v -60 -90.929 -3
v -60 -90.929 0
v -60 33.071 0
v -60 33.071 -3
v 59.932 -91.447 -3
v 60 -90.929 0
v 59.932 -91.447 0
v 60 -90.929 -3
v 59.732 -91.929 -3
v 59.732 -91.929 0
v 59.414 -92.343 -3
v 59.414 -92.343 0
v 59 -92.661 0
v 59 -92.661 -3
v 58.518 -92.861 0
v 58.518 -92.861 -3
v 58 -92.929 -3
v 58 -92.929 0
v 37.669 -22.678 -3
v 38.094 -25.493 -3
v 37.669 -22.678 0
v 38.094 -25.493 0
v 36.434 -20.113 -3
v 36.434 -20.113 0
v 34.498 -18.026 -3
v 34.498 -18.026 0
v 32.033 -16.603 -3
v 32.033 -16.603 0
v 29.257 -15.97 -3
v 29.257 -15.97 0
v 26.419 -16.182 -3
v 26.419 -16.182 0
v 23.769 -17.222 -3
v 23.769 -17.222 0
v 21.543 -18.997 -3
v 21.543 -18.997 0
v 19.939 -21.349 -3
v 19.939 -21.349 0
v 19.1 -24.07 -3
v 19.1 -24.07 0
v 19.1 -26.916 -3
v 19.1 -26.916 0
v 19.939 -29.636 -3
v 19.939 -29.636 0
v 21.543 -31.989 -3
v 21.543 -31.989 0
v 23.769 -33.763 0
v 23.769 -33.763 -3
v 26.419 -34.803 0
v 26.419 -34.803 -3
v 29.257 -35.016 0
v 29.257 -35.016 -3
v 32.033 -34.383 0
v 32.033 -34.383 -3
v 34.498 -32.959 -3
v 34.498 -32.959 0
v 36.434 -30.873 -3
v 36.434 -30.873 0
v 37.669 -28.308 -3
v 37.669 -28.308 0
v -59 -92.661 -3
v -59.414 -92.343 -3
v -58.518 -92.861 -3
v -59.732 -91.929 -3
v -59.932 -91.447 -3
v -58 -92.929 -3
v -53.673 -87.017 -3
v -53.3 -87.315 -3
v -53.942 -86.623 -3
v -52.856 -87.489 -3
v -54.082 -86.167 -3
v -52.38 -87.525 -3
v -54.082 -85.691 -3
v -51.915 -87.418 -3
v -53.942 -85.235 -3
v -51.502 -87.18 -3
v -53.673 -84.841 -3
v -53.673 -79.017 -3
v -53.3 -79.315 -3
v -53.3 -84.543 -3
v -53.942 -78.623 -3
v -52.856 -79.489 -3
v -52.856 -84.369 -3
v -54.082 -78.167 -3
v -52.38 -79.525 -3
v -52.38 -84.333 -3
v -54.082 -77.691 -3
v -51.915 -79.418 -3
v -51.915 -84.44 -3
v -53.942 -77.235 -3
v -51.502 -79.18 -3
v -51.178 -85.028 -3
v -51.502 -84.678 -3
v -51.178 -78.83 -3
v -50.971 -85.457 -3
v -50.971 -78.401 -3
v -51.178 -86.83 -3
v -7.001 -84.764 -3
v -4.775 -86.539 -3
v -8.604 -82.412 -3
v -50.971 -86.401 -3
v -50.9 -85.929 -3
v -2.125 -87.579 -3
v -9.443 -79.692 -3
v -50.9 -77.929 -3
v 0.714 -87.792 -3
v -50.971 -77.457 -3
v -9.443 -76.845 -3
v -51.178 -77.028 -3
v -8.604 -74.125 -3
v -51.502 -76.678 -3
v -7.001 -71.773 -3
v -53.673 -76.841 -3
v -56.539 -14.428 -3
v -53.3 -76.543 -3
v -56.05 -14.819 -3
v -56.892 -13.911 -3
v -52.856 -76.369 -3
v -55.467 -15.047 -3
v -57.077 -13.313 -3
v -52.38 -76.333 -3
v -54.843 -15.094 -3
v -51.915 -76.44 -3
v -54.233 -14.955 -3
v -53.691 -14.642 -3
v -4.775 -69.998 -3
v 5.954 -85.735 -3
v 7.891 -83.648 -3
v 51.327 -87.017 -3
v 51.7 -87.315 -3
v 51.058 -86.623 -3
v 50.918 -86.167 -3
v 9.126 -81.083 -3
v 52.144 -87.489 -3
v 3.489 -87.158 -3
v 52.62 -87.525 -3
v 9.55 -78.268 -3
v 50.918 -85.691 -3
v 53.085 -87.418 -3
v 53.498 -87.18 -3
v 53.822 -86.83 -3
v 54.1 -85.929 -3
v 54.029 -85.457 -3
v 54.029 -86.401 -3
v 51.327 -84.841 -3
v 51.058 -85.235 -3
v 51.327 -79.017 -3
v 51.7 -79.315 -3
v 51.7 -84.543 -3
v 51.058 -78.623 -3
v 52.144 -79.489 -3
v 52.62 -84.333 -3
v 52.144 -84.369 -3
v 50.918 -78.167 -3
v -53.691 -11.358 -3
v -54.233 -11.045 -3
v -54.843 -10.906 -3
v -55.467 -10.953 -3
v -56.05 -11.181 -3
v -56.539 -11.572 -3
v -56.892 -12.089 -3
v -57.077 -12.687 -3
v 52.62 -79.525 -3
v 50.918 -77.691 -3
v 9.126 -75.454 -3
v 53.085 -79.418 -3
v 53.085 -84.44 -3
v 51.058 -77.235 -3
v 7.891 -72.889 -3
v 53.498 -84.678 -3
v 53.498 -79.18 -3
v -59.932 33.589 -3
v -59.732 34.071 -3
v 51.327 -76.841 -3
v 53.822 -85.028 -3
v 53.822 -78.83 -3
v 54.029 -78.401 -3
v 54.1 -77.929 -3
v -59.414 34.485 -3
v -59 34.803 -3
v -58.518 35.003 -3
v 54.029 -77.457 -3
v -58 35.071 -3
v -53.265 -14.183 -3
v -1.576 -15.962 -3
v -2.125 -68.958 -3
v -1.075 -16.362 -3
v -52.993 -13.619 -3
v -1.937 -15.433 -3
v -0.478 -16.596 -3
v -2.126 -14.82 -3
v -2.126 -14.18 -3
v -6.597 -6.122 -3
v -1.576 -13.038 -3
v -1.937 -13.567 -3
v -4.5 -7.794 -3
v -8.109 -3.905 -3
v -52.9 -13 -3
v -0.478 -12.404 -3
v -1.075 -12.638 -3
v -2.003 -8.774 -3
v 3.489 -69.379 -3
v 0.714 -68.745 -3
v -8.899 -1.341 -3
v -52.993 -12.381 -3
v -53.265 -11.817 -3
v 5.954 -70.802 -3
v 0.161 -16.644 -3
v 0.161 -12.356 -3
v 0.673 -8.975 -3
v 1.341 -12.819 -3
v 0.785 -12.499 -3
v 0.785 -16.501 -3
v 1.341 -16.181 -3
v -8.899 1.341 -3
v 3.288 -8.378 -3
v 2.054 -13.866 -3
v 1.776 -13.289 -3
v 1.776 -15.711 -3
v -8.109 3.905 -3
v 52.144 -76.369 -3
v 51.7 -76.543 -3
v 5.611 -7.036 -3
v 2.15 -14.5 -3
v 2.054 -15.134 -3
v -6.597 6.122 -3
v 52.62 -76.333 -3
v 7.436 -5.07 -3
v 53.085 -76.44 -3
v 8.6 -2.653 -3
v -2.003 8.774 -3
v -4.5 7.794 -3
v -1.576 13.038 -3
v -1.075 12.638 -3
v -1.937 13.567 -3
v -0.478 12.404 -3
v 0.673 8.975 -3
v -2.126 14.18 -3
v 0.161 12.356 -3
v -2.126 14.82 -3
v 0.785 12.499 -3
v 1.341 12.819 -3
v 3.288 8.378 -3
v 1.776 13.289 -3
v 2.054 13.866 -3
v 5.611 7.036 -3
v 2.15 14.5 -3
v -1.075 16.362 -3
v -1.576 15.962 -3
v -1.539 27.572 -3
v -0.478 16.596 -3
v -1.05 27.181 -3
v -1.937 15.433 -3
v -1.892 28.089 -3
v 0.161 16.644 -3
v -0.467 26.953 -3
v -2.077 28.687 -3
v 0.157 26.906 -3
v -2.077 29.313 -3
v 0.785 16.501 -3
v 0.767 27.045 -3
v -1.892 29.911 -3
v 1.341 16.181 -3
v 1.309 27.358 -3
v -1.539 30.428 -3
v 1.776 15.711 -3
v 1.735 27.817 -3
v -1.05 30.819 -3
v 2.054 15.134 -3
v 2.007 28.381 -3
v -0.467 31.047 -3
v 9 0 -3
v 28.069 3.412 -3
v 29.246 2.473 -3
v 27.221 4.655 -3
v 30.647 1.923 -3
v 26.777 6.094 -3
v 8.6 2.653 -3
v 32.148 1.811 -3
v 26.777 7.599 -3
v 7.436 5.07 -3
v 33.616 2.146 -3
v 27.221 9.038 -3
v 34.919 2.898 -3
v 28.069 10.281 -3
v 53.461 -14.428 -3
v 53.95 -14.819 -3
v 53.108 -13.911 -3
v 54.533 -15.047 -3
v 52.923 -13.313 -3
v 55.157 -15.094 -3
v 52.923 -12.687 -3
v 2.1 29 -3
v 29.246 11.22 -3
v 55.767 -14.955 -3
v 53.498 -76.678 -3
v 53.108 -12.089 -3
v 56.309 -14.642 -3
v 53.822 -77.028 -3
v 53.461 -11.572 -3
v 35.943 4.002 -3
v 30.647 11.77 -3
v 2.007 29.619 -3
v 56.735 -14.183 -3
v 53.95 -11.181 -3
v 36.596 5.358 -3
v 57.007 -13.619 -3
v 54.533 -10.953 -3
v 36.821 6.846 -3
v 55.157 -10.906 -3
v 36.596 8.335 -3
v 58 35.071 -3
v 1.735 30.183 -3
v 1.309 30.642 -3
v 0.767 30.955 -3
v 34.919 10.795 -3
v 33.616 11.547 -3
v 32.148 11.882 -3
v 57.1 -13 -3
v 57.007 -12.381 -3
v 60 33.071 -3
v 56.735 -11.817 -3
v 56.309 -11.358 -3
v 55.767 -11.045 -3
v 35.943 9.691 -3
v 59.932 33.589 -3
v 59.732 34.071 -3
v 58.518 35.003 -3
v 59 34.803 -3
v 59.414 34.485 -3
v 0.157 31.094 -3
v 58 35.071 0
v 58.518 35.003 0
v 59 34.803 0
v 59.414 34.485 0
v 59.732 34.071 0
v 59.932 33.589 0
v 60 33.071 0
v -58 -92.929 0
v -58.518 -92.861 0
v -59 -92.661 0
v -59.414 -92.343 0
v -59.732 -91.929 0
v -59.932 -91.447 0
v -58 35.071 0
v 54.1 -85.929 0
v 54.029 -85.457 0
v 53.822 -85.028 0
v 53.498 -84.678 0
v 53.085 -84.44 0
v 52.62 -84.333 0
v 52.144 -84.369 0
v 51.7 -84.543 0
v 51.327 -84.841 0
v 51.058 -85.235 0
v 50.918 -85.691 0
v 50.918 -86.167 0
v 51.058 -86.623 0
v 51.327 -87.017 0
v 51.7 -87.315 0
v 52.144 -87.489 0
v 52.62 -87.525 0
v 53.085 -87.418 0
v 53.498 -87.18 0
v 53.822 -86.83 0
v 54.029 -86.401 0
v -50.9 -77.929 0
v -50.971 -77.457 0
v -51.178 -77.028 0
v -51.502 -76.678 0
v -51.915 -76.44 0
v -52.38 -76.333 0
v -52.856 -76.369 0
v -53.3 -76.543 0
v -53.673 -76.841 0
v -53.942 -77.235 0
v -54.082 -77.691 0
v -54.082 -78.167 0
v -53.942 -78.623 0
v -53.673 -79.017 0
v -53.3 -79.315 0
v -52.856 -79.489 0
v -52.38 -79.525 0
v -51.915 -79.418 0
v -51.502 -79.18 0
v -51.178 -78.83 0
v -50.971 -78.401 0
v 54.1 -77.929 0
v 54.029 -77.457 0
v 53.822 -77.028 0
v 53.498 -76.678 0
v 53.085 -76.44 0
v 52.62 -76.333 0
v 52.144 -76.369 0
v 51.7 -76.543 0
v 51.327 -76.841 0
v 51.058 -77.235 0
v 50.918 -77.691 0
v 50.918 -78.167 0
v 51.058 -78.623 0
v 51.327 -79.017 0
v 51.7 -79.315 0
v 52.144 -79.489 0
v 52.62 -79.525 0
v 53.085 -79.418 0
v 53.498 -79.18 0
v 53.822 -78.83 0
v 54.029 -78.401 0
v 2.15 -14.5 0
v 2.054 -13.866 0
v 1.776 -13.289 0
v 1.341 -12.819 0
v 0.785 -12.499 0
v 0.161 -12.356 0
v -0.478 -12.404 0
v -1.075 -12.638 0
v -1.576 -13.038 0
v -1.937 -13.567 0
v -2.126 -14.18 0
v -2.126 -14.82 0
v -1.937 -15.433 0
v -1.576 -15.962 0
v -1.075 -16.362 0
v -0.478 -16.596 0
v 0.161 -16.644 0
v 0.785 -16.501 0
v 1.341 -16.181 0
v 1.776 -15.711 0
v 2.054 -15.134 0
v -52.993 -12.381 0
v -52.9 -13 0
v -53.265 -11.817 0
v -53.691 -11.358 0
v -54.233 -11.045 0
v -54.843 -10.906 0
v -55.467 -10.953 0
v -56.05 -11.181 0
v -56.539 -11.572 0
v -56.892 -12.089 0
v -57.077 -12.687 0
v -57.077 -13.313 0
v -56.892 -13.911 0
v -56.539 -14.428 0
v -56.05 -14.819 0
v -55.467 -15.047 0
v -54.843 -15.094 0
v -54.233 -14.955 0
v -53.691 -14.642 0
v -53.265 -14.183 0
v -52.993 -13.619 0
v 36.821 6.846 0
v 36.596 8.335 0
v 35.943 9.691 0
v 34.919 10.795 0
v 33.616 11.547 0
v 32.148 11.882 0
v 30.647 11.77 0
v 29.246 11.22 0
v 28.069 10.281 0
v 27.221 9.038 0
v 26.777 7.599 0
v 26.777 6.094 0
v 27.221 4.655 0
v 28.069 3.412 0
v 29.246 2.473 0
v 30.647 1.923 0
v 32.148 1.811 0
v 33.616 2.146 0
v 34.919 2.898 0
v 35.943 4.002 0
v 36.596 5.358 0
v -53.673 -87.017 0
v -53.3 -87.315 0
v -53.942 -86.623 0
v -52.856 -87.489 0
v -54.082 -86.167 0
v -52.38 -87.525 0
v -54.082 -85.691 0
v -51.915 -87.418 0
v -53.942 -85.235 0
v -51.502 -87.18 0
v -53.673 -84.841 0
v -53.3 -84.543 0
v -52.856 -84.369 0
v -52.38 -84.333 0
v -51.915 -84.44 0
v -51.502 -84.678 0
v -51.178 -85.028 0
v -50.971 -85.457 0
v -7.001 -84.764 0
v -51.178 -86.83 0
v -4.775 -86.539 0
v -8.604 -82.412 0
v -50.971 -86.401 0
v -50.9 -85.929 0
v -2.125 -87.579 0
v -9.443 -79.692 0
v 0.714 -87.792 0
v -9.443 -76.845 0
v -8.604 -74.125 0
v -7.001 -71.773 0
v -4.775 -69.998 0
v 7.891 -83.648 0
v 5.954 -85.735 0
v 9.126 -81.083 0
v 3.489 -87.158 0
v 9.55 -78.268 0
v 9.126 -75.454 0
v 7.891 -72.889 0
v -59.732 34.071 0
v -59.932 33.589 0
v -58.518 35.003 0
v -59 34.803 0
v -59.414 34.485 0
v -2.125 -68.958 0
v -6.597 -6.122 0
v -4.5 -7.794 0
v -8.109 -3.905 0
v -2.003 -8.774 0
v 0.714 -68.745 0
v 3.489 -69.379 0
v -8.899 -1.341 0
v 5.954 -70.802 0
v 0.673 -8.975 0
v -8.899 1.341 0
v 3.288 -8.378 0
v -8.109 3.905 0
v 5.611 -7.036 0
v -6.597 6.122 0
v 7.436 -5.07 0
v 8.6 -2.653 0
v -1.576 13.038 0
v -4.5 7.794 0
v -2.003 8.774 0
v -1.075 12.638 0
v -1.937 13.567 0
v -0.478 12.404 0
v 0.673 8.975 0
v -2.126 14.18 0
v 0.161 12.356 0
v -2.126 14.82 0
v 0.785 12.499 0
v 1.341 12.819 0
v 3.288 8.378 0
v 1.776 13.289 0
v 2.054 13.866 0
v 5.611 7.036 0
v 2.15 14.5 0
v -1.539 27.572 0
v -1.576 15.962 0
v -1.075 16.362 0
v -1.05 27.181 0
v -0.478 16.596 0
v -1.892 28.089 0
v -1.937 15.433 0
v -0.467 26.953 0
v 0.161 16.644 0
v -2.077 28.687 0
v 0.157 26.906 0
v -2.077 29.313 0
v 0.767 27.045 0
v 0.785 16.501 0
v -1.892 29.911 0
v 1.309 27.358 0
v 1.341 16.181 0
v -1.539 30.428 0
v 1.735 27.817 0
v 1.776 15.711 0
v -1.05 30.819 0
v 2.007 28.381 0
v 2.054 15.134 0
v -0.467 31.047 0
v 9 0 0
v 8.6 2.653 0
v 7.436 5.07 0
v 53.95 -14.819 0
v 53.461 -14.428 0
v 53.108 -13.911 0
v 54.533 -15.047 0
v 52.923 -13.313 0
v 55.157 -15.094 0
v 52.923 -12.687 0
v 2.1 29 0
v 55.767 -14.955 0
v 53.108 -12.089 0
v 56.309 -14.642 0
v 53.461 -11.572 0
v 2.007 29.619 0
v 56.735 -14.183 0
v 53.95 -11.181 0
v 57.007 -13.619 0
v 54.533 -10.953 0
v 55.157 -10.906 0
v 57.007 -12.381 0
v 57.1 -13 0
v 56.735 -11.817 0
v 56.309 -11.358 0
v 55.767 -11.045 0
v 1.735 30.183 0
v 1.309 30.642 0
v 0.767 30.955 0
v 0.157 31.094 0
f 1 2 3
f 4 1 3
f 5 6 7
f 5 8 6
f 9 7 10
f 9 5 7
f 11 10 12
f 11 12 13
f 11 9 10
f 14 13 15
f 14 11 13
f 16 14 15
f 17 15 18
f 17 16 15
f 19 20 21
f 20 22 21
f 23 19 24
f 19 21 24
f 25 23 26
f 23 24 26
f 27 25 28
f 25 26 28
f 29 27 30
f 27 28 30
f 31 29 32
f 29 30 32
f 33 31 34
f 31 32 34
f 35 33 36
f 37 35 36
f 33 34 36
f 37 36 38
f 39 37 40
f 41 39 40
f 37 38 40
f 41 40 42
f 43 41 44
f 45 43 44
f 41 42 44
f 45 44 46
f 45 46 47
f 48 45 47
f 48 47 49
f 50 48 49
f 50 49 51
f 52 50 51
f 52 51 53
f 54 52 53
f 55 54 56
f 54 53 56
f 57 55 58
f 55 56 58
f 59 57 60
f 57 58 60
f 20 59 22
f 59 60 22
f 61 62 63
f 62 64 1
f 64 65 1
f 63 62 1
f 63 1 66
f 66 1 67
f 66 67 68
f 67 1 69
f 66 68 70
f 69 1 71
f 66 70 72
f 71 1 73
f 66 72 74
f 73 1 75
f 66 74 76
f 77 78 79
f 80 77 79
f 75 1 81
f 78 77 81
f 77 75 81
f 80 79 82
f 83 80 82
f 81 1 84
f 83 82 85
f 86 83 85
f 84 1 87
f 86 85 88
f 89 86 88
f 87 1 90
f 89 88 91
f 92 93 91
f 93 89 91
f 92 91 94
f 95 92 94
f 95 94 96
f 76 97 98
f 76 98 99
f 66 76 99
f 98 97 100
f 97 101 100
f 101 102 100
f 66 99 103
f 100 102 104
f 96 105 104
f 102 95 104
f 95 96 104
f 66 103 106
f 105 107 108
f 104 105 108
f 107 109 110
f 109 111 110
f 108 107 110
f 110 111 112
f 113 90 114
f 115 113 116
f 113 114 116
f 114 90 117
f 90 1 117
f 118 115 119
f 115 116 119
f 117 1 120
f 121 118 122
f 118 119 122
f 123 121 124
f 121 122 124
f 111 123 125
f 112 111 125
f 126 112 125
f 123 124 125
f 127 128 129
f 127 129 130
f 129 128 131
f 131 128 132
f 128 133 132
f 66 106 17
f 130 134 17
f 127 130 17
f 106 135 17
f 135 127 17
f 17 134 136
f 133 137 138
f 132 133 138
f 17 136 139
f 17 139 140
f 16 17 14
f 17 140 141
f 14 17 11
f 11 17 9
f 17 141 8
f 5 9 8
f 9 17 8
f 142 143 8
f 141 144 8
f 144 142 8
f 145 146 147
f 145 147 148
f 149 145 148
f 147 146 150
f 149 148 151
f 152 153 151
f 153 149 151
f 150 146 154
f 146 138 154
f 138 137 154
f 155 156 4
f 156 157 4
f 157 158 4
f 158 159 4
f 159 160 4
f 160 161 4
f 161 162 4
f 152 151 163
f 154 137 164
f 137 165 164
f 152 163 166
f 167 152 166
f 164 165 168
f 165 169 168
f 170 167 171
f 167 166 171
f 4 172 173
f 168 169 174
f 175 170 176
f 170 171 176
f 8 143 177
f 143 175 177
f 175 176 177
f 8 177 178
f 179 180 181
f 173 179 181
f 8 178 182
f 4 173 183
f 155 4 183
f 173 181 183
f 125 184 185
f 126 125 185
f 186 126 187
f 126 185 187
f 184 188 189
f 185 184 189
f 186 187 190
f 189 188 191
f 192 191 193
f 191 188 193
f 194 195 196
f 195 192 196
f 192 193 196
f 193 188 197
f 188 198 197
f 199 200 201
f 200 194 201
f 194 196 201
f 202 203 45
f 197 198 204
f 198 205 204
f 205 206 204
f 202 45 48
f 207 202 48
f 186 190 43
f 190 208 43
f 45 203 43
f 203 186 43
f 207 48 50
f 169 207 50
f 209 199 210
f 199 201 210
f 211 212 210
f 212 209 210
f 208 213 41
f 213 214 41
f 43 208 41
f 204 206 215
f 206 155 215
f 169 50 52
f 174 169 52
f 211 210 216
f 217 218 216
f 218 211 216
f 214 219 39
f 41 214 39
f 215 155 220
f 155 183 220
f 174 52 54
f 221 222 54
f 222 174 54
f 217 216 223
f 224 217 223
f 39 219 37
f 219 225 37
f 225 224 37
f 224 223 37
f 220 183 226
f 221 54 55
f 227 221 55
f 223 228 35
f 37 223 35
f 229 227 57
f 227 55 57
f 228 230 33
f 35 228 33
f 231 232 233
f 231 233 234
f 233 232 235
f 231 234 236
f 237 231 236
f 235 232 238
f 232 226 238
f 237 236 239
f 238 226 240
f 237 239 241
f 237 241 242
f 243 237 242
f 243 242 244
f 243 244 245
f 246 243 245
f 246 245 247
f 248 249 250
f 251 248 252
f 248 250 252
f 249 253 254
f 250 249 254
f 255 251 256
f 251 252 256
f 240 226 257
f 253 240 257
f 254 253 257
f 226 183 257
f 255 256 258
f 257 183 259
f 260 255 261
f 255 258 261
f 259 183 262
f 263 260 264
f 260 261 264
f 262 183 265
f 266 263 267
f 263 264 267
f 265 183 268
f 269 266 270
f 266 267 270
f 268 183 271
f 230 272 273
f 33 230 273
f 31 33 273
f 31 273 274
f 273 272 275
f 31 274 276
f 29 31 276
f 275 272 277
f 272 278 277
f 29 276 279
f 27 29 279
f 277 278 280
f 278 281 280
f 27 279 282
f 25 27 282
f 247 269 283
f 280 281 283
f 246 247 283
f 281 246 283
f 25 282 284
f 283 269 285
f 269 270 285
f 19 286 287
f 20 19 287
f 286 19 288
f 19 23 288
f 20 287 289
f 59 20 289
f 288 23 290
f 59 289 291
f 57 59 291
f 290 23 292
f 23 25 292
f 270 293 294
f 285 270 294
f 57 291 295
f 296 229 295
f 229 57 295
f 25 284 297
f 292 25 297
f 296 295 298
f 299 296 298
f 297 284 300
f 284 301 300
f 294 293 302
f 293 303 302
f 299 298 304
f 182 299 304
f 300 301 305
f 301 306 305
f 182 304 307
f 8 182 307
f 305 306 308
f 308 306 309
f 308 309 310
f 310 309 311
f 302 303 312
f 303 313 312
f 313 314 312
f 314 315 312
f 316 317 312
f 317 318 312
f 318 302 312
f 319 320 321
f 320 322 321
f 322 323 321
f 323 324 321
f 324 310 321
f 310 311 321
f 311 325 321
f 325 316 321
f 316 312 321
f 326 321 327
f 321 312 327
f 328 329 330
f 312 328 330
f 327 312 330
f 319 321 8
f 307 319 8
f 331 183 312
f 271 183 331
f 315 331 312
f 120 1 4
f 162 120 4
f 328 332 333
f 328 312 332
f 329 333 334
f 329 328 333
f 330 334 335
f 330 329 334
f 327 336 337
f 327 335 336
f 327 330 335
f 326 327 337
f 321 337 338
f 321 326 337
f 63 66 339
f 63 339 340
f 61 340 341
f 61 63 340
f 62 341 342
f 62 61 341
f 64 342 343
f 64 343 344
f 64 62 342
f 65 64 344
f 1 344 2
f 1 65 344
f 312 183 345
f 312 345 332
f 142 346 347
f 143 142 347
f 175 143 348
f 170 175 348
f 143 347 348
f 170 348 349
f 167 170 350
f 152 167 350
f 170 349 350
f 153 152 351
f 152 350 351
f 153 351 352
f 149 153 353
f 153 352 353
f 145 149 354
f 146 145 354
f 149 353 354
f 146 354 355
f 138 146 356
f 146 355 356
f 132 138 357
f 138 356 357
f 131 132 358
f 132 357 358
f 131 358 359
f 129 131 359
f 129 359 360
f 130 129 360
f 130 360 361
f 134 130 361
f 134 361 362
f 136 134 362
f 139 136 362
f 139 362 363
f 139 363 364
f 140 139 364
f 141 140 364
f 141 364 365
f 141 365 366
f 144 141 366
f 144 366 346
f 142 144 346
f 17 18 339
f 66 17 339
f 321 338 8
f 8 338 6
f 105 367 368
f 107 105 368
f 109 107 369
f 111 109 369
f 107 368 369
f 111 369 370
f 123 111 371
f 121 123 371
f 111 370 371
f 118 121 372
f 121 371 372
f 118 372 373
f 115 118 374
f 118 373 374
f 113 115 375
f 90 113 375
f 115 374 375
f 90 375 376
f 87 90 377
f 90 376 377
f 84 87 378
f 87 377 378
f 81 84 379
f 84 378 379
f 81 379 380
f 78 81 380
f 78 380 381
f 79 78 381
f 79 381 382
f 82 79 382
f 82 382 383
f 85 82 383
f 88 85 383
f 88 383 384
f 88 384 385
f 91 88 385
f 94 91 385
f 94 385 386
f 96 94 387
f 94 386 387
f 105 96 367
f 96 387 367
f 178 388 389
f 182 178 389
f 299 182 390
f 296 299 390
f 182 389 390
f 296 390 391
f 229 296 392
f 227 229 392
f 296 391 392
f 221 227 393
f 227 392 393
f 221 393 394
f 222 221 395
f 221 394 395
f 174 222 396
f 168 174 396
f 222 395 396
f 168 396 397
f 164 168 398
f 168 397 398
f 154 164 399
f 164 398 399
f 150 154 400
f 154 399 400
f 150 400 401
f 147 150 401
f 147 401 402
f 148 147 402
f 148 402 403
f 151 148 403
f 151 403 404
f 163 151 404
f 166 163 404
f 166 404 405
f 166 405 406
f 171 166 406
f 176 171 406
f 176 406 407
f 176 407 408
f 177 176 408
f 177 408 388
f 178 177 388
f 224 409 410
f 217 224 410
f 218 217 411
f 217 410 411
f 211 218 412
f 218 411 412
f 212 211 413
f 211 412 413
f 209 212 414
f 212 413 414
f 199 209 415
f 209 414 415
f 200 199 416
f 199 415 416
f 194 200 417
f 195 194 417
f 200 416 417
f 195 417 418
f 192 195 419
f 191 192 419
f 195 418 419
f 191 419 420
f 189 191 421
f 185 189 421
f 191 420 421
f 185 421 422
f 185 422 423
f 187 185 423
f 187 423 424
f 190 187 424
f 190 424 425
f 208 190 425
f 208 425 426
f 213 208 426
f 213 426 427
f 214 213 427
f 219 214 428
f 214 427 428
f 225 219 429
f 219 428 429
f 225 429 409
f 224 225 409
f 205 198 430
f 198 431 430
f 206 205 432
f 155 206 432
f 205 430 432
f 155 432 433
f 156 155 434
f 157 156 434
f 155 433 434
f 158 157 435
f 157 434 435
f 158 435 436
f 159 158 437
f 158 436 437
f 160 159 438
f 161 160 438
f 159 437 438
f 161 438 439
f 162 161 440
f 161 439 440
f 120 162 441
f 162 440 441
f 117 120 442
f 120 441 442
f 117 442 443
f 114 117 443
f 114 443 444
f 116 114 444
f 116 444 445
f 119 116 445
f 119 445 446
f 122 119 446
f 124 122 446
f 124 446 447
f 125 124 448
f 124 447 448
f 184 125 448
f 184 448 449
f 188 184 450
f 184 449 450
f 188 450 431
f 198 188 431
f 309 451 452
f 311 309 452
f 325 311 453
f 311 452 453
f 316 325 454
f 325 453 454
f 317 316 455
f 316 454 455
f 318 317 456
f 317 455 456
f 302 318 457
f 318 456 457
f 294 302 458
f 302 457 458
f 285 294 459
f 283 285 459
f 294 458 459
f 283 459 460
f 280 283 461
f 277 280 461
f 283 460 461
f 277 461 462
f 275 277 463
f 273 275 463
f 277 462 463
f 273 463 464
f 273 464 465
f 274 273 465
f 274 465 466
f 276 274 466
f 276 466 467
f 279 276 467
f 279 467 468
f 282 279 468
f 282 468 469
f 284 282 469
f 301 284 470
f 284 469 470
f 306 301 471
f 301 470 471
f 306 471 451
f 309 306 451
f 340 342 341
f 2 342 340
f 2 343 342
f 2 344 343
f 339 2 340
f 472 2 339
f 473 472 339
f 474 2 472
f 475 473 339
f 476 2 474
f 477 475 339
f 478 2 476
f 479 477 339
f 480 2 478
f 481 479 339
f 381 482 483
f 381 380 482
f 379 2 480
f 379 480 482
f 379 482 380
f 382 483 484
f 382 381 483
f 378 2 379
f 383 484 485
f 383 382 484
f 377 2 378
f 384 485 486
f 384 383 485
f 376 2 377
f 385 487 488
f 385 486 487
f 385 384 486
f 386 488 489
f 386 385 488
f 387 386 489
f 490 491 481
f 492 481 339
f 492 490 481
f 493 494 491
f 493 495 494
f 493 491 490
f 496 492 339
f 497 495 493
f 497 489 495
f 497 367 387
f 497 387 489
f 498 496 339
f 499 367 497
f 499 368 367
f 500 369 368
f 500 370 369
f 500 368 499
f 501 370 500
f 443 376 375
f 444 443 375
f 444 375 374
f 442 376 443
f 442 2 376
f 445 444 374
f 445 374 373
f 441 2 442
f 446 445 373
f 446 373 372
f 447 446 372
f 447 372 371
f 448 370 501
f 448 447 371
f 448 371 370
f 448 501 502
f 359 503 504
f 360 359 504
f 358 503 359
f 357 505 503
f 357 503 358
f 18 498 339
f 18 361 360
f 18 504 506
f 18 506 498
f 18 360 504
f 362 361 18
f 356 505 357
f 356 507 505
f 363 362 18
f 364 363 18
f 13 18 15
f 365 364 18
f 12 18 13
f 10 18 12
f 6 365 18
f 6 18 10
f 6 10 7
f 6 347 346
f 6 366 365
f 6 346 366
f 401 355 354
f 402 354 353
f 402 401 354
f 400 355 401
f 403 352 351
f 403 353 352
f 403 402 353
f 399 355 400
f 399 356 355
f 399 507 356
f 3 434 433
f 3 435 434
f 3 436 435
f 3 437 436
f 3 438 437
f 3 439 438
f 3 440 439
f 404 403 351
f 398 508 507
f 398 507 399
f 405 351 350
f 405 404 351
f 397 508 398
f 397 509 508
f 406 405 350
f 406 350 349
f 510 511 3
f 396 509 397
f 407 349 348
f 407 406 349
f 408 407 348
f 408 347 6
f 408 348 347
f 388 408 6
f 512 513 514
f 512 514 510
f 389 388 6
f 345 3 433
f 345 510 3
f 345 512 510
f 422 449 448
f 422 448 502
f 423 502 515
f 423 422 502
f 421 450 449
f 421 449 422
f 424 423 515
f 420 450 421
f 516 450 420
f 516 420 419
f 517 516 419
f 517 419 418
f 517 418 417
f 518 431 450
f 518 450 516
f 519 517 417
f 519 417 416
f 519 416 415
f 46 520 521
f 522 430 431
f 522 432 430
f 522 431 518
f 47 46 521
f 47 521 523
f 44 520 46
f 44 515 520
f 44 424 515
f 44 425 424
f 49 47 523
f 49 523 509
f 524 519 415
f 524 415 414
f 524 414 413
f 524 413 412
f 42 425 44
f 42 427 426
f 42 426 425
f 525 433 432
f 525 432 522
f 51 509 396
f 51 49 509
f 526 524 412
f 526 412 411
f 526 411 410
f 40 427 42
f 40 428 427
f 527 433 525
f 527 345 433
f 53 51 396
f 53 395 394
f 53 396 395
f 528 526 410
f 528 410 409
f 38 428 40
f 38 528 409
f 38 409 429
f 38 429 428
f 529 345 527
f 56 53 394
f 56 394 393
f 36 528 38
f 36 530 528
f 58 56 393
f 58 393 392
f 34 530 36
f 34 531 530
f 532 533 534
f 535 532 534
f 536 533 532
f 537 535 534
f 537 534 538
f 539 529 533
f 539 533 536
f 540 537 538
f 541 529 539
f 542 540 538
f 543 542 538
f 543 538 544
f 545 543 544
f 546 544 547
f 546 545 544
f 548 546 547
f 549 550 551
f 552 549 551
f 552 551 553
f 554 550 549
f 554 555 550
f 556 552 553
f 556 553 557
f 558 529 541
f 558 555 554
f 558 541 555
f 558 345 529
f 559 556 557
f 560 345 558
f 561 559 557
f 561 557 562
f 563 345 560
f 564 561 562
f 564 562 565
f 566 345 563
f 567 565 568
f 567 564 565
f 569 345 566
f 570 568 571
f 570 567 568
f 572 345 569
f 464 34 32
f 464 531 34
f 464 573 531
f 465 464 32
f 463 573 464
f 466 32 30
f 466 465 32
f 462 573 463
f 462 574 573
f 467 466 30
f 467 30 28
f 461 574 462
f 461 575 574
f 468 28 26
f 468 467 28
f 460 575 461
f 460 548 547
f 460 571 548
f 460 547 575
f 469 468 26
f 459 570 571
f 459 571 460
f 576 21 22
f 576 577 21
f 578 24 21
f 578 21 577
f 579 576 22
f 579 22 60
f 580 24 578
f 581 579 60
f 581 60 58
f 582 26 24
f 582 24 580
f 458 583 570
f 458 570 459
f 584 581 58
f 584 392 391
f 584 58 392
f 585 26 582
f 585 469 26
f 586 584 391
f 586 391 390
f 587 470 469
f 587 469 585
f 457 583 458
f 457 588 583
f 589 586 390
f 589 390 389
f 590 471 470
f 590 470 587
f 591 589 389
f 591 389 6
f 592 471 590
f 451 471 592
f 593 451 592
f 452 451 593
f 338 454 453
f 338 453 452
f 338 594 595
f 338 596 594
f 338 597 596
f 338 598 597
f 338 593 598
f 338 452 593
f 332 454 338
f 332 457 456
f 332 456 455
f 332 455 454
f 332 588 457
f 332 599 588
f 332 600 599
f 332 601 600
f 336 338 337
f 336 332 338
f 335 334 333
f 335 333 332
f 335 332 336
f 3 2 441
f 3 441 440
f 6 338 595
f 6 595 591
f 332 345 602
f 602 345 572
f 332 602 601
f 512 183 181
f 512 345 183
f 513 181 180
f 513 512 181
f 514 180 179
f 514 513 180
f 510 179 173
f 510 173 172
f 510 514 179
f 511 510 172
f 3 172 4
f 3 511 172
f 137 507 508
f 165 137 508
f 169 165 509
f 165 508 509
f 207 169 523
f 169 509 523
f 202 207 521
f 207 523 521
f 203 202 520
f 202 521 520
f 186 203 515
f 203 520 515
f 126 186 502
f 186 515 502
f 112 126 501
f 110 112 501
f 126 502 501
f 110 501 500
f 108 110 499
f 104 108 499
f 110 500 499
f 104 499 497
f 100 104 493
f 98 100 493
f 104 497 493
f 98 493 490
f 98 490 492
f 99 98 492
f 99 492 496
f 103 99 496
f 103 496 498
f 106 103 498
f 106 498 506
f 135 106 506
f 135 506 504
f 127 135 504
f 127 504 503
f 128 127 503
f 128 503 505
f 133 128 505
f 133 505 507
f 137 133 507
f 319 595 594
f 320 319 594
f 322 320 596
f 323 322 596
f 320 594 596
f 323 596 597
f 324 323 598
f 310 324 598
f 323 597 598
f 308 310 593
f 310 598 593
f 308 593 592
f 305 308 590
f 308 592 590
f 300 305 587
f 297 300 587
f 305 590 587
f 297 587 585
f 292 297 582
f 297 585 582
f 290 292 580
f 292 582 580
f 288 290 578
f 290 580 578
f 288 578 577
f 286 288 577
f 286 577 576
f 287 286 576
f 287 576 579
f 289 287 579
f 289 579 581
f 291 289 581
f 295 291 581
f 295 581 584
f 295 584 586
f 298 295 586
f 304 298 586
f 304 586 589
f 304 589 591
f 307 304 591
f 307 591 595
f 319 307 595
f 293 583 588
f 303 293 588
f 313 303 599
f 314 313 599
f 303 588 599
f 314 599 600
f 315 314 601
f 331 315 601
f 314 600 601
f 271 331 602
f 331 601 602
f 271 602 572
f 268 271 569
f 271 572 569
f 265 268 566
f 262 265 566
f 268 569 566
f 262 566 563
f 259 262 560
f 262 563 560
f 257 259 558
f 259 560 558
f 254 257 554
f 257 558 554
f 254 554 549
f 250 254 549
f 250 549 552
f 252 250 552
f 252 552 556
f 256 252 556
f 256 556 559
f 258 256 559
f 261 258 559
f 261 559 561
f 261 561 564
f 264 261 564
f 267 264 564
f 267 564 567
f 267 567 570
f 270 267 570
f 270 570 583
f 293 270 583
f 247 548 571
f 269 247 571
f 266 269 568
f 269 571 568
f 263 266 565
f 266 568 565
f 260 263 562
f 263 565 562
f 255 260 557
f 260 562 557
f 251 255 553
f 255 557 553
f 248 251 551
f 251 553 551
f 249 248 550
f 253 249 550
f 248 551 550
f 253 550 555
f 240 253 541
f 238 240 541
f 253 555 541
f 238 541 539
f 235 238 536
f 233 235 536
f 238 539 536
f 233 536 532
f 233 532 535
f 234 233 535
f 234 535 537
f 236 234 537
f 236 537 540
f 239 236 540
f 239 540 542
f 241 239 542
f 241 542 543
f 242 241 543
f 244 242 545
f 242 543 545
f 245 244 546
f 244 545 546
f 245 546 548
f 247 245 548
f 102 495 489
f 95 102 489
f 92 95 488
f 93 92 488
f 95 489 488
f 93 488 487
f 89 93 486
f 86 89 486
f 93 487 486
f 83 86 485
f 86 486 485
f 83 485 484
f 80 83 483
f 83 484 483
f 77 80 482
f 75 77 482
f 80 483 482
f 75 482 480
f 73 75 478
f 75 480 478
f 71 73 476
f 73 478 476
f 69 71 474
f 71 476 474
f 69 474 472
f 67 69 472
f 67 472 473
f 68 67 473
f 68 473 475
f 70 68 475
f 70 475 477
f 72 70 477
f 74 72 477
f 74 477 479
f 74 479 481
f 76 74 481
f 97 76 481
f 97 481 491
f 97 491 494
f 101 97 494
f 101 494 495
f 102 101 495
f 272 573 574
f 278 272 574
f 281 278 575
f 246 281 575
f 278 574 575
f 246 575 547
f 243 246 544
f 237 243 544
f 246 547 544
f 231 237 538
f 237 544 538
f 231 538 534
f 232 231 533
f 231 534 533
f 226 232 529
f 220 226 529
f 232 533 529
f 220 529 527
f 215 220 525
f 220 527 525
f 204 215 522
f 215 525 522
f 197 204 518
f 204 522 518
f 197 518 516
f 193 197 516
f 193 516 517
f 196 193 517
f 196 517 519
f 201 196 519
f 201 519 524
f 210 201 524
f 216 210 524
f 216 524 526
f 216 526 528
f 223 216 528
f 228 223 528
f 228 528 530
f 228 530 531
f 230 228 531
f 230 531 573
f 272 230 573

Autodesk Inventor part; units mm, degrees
ref_plane "YZ Plane" through (0, 0, 0) normal (1, 0, 0) x (0, 1, 0)
ref_plane "XZ Plane" through (0, 0, 0) normal (0, 1, 0) x (-1, 0, 0)
ref_plane "XY Plane" through (0, 0, 0) normal (0, 0, 1) x (1, 0, 0)
sketch "スケッチ3" plane through (0, 0, 0) normal (0, 0, 1) x (1, 0, 0)
  line L0 (60, -99.3436) -> (-60, -99.3436)
  line L1 (-60, -99.3436) -> (-60, 99.3436)
  line L2 (-60, 99.3436) -> (60, 99.3436)
  line L3 (60, 99.3436) -> (60, -99.3436)
  line L4 (60, -99.3436) -> (-60, 99.3436) construction
  line L5 (-60, -99.3436) -> (60, 99.3436) construction
  point P0 (0, 0)
  dimension "d25" = 120
extrude "押し出し1" add sketch "スケッチ3" against normal blind 3
sketch "スケッチ4" plane through (0, 0, 0) normal (0, 0, 1) x (1, 0, 0)
  line L0 (0, 45.0711) -> (68.3595, 45.0711)
  line L1 (68.3595, 45.0711) -> (-74.3824, 45.0711)
  line L2 (-74.3824, 45.0711) -> (108.1656, 45.0711)
  line L3 (108.1656, 45.0711) -> (108.1656, 129.4154)
  line L4 (108.1656, 129.4154) -> (-74.3824, 129.4154)
  line L5 (-74.3824, 129.4154) -> (-74.3824, 45.0711)
  point P0 (0, 0)
extrude "押し出し4" cut sketch "スケッチ4" against normal blind 10
sketch "スケッチ12" plane through (0, 0, 0) normal (0, 0, 1) x (1, 0, 0)
  circle A0 centre (0, 0) radius 9
  circle A1 centre (0, 0) radius 22.5
  dimension "d85" = 18
  dimension "d93" = 45
sketch "スケッチ13" plane through (0, 0, 0) normal (0, 0, 1) x (1, 0, 0)
  circle A0 centre (0, 0) radius 7.5
  circle A1 centre (0, 0) radius 32.5
  circle A2 centre (31.7707, 6.8465) radius 25
  circle A3 centre (31.7707, 6.8465) radius 7.5
  circle A4 centre (31.7707, 6.8465) radius 32.5
  circle A5 centre (28.5436, -25.4929) radius 25
  circle A6 centre (28.5436, -25.4929) radius 20
  circle A7 centre (28.5436, -25.4929) radius 60
  circle A8 centre (0, -78.2685) radius 40
  circle A9 centre (0, -78.2685) radius 50
  circle A10 centre (31.7707, 6.8465) radius 5.05
  circle A11 centre (28.5436, -25.4929) radius 9.55
  circle A12 centre (0, -78.2685) radius 9.55
  dimension "d87" = 65
  dimension "d89" = 65
  dimension "d91" = 120
  dimension "d86" = 15
  dimension "d88" = 15
  dimension "d90" = 40
  dimension "d92" = 100
  dimension "d96" = 10.1
  dimension "d97" = 19.1
  dimension "d98" = 19.1
extrude "押し出し15" cut sketch "スケッチ12" against normal blind 10 contours A0
extrude "押し出し16" cut sketch "スケッチ13" against normal blind 10 contours A10 A1 | A1 A10 | A11 A1 A2 | A2 A1 A4 A11 | A4 A1 A11 | A2 A11 A4 A1 | A1 A11 A2 | A4 A11 A1 | A12 A7 | A7 A12
sketch "スケッチ14" plane through (0, 0, 0) normal (0, 0, 1) x (1, 0, 0)
  line L0 (-60, -99.3436) -> (-60, 45.0711) projected
  line L1 (60, 45.0711) -> (60, -99.3436) projected
  line L2 (-60, 45.0711) -> (60, 45.0711)
  line L3 (60, 45.0711) -> (60, -92.9289)
  line L4 (60, -92.9289) -> (-60, -92.9289)
  line L5 (-60, -92.9289) -> (-60, 45.0711)
  point P0 (0, 0)
  dimension "d101" = 138
extrude "押し出し17" cut sketch "スケッチ14" against normal blind 10 keep common part
sketch "スケッチ15" plane through (-60, 45.0711, 0) normal (0, 1, 0) x (1, 0, 0)
  line L0 (-15.5399, 21.7204) -> (138.9638, 21.7204)
  line L1 (138.9638, 21.7204) -> (138.9638, -41.1938)
  line L2 (138.9638, -41.1938) -> (-15.5399, -41.1938)
  line L3 (-15.5399, -41.1938) -> (-15.5399, 21.7204)
  point P0 (60, 0)
extrude "押し出し18" cut sketch "スケッチ15" against normal blind 10
sketch "スケッチ16" plane through (0, 0, 0) normal (0, 0, 1) x (1, 0, 0)
  circle A0 centre (31.7707, 6.8465) radius 5.05 projected
  circle A1 centre (31.7707, 6.8465) radius 25
  circle A2 centre (28.5436, -25.4929) radius 9.55 projected
  circle A3 centre (28.5436, -25.4929) radius 25
  circle A4 centre (55, -13) radius 2.1
  circle A5 centre (-55, -13) radius 2.1
  circle A6 centre (0, 29) radius 2.1
  point P0 (0, 0)
  dimension "d109" = 50
  dimension "d110" = 50
  dimension "d111" = 4.2
  dimension "d112" = 4.2
  dimension "d113" = 4.2
extrude "押し出し19" cut sketch "スケッチ16" against normal blind 10 contours A4 | A5 | A6
sketch "スケッチ17" plane through (0, 0, 0) normal (0, 0, 1) x (1, 0, 0)
  line L0 (0, 0) -> (0, 14.5)
  line L1 (0, 14.5) -> (0, -14.5)
  circle A0 centre (0, 14.5) radius 2.15
  circle A1 centre (0, -14.5) radius 2.15
  dimension "d116" = 14.5
  dimension "d117" = 29
  dimension "d118" = 4.3
  dimension "d119" = 4.3
extrude "押し出し20" cut sketch "スケッチ17" against normal blind 10
sketch "スケッチ18" plane through (0, 0, 0) normal (0, 0, 1) x (1, 0, 0)
  circle A0 centre (-52.5, -85.929) radius 1.6
  circle A1 centre (-52.5, -77.929) radius 1.6
  circle A2 centre (52.5, -77.929) radius 1.6
  circle A3 centre (52.5, -85.929) radius 1.6
  point P0 (0, 0)
  dimension "d122" = 3.2
  dimension "d123" = 3.2
  dimension "d124" = 3.2
  dimension "d125" = 3.2
extrude "押し出し21" cut sketch "スケッチ18" against normal blind 3.2
fillet "フィレット2" radius 2 4 edges at (-60, 35.0711, -1.5) (60, 35.0711, -1.5) (60, -92.9289, -1.5) (-60, -92.9289, -1.5)
properties part number "板2" material "アルミニウム 6061"
